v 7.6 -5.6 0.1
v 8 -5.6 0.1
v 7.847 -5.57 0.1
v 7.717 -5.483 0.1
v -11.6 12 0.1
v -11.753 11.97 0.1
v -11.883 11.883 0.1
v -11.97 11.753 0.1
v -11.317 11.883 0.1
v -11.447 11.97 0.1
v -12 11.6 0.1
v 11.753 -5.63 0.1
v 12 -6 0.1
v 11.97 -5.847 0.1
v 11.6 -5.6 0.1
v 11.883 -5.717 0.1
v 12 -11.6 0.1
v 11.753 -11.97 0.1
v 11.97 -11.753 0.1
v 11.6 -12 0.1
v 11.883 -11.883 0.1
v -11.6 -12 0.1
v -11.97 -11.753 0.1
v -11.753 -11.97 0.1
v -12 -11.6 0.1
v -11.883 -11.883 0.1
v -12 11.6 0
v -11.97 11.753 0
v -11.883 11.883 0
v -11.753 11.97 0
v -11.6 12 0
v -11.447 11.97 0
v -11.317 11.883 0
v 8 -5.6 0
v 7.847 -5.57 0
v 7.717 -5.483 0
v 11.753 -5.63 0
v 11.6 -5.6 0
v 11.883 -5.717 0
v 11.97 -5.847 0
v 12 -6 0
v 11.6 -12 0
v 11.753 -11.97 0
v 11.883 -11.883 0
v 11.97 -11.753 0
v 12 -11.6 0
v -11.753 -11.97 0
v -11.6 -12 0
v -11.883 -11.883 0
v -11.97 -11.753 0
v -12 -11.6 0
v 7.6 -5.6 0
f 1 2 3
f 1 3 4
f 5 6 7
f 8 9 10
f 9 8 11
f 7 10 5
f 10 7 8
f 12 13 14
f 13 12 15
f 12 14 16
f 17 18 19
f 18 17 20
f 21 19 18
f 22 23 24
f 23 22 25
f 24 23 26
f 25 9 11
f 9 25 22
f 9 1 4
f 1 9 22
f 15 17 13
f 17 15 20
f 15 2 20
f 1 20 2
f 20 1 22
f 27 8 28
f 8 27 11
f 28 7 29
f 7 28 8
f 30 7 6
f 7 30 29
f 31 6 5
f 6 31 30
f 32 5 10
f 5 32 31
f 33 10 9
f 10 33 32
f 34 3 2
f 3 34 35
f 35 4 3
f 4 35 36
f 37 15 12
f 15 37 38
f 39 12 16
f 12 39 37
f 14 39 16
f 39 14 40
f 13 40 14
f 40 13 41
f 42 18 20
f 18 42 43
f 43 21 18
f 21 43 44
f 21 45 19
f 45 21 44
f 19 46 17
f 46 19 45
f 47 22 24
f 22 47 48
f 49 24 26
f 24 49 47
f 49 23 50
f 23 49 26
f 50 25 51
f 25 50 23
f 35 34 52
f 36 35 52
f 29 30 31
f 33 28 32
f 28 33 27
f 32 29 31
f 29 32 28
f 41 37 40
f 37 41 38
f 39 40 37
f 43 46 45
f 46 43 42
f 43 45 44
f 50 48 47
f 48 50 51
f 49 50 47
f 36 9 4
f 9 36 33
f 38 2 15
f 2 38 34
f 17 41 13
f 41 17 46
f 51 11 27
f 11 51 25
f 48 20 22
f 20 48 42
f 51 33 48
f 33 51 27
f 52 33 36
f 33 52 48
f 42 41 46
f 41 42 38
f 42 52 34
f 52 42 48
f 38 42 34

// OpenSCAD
// file: ../p/3-8cyli.scad
use <../lib.scad>
function ldraw_lib__3_8cyli() = [
// 0 Cylinder 0.375
// 0 Name: 3-8cyli.dat
// 0 Author: James Jessiman
// 0 !LDRAW_ORG Primitive UPDATE 2005-01
// 0 !LICENSE Licensed under CC BY 2.0 and CC BY 4.0 : see CAreadme.txt
// 
// 0 BFC CERTIFY CCW
  [0,"BFC","CERTIFY"],
  [0,"BFC","CCW"],
// 
// 0 !HISTORY 2002-05-08 [OrionP] Made BFC compliant
// 0 !HISTORY 2002-08-18 [PTadmin] Official Update 2002-04
// 0 !HISTORY 2004-12-11 [nielsk] Recreated using Primitive Generator, Edge lines fixed, BFC changed to CCW
// 0 !HISTORY 2005-12-28 [PTadmin] Official Update 2005-01
// 0 !HISTORY 2007-06-24 [PTadmin] Header formatted for Contributor Agreement
// 0 !HISTORY 2008-07-01 [PTadmin] Official Update 2008-01
// 
// 
// 4 16 .9239 1 .3827 .9239 0 .3827 1 0 0 1 1 0
  [4,16,.9239,1,.3827,.9239,0,.3827,1,0,0,1,1,0],
// 4 16 .7071 1 .7071 .7071 0 .7071 .9239 0 .3827 .9239 1 .3827
  [4,16,.7071,1,.7071,.7071,0,.7071,.9239,0,.3827,.9239,1,.3827],
// 4 16 .3827 1 .9239 .3827 0 .9239 .7071 0 .7071 .7071 1 .7071
  [4,16,.3827,1,.9239,.3827,0,.9239,.7071,0,.7071,.7071,1,.7071],
// 4 16 0 1 1 0 0 1 .3827 0 .9239 .3827 1 .9239
  [4,16,0,1,1,0,0,1,.3827,0,.9239,.3827,1,.9239],
// 4 16 -.3827 1 .9239 -.3827 0 .9239 0 0 1 0 1 1
  [4,16,-.3827,1,.9239,-.3827,0,.9239,0,0,1,0,1,1],
// 4 16 -.7071 1 .7071 -.7071 0 .7071 -.3827 0 .9239 -.3827 1 .9239
  [4,16,-.7071,1,.7071,-.7071,0,.7071,-.3827,0,.9239,-.3827,1,.9239],
// 5 24 1 1 0 1 0 0 1 1 -.4142 .9239 1 .3827
  [5,24,1,1,0,1,0,0,1,1,-.4142,.9239,1,.3827],
// 5 24 .9239 1 .3827 .9239 0 .3827 1 1 0 .7071 1 .7071
  [5,24,.9239,1,.3827,.9239,0,.3827,1,1,0,.7071,1,.7071],
// 5 24 .7071 1 .7071 .7071 0 .7071 .9239 1 .3827 .3827 1 .9239
  [5,24,.7071,1,.7071,.7071,0,.7071,.9239,1,.3827,.3827,1,.9239],
// 5 24 .3827 1 .9239 .3827 0 .9239 .7071 1 .7071 0 1 1
  [5,24,.3827,1,.9239,.3827,0,.9239,.7071,1,.7071,0,1,1],
// 5 24 0 1 1 0 0 1 .3827 1 .9239 -.3827 1 .9239
  [5,24,0,1,1,0,0,1,.3827,1,.9239,-.3827,1,.9239],
// 5 24 -.3827 1 .9239 -.3827 0 .9239 0 1 1 -.7071 1 .7071
  [5,24,-.3827,1,.9239,-.3827,0,.9239,0,1,1,-.7071,1,.7071],
// 5 24 -.7071 1 .7071 -.7071 0 .7071 -.3827 1 .9239 -1 1 .4142
  [5,24,-.7071,1,.7071,-.7071,0,.7071,-.3827,1,.9239,-1,1,.4142],
// 0
];
module ldraw_lib__3_8cyli(step=0, col=false, unit=2/5, alt=false, line=0.2, solid=!$preview)
    makepoly(ldraw_lib__3_8cyli(), step=step, col=col, unit=unit, alt=alt, line=line, solid=solid);
ldraw_lib__3_8cyli(line=0.2);
// file: ../p/3-8chrd.scad
use <../lib.scad>
function ldraw_lib__3_8chrd() = [
// 0 Chord 0.375
// 0 Name: 3-8chrd.dat
// 0 Author: Donald Sutter [technog]
// 0 !LDRAW_ORG Primitive UPDATE 2005-01
// 0 !LICENSE Licensed under CC BY 2.0 and CC BY 4.0 : see CAreadme.txt
// 
// 0 BFC CERTIFY CCW
  [0,"BFC","CERTIFY"],
  [0,"BFC","CCW"],
// 
// 0 !HISTORY 2004-01-07 [Steffen] added primitive code for POVray
// 0 !HISTORY 2004-03-18 [mkennedy] removed pov code and rearanged polygons.
// 0 !HISTORY 2004-09-12 [cwdee] reversed winding and standardised precision
// 0 !HISTORY 2005-12-28 [PTadmin] Official Update 2005-01
// 0 !HISTORY 2007-06-24 [PTadmin] Header formatted for Contributor Agreement
// 0 !HISTORY 2008-07-01 [PTadmin] Official Update 2008-01
// 
// 
// 3 16 0.7071 0 0.7071 0.3827 0 0.9239 0 0 1
  [3,16,0.7071,0,0.7071,0.3827,0,0.9239,0,0,1],
// 4 16 0.9239 0 0.3827 -0.3827 0 0.9239 -0.7071 0 0.7071 1 0 0
  [4,16,0.9239,0,0.3827,-0.3827,0,0.9239,-0.7071,0,0.7071,1,0,0],
// 4 16 0.7071 0 0.7071 0 0 1 -0.3827 0 0.9239 0.9239 0 0.3827
  [4,16,0.7071,0,0.7071,0,0,1,-0.3827,0,0.9239,0.9239,0,0.3827],
// 0
];
module ldraw_lib__3_8chrd(step=0, col=false, unit=2/5, alt=false, line=0.2, solid=!$preview)
    makepoly(ldraw_lib__3_8chrd(), step=step, col=col, unit=unit, alt=alt, line=line, solid=solid);
ldraw_lib__3_8chrd(line=0.2);
// file: ../p/1-8ndis.scad
use <../lib.scad>
function ldraw_lib__1_8ndis() = [
// 0 Disc Negative 0.125
// 0 Name: 1-8ndis.dat
// 0 Author: James Jessiman
// 0 !LDRAW_ORG Primitive UPDATE 2012-01
// 0 !LICENSE Licensed under CC BY 2.0 and CC BY 4.0 : see CAreadme.txt
// 
// 0 BFC CERTIFY CCW
  [0,"BFC","CERTIFY"],
  [0,"BFC","CCW"],
// 
// 0 !HISTORY 2002-03-23 [sbliss] Added BFC statement
// 0 !HISTORY 2002-04-25 [PTadmin] Official Update 2002-02
// 0 !HISTORY 2007-06-22 [PTadmin] Header formatted for Contributor Agreement
// 0 !HISTORY 2008-07-01 [PTadmin] Official Update 2008-01
// 0 !HISTORY 2012-02-16 [Philo] Changed to CCW
// 0 !HISTORY 2012-03-30 [PTadmin] Official Update 2012-01
// 
// 
// 3 16 0.9239 0 0.3827 1 0 0 1 0 1
  [3,16,0.9239,0,0.3827,1,0,0,1,0,1],
// 3 16 0.7071 0 0.7071 0.9239 0 0.3827 1 0 1
  [3,16,0.7071,0,0.7071,0.9239,0,0.3827,1,0,1],
];
module ldraw_lib__1_8ndis(step=0, col=false, unit=2/5, alt=false, line=0.2, solid=!$preview)
    makepoly(ldraw_lib__1_8ndis(), step=step, col=col, unit=unit, alt=alt, line=line, solid=solid);
ldraw_lib__1_8ndis(line=0.2);
// file: ../p/1-8cyli.scad
use <../lib.scad>
function ldraw_lib__1_8cyli() = [
// 0 Cylinder 0.125
// 0 Name: 1-8cyli.dat
// 0 Author: James Jessiman
// 0 !LDRAW_ORG Primitive UPDATE 2005-01
// 0 !LICENSE Licensed under CC BY 2.0 and CC BY 4.0 : see CAreadme.txt
// 
// 0 BFC CERTIFY CCW
  [0,"BFC","CERTIFY"],
  [0,"BFC","CCW"],
// 
// 0 !HISTORY 2002-04-25 [PTadmin] Official Update 2002-02
// 0 !HISTORY 2004-12-11 [nielsk] Recreated using Primitive Generator, Edge lines fixed, BFC changed to CCW
// 0 !HISTORY 2005-12-28 [PTadmin] Official Update 2005-01
// 0 !HISTORY 2007-06-22 [PTadmin] Header formatted for Contributor Agreement
// 0 !HISTORY 2008-07-01 [PTadmin] Official Update 2008-01
// 
// 
// 4 16 .9239 1 .3827 .9239 0 .3827 1 0 0 1 1 0
  [4,16,.9239,1,.3827,.9239,0,.3827,1,0,0,1,1,0],
// 4 16 .7071 1 .7071 .7071 0 .7071 .9239 0 .3827 .9239 1 .3827
  [4,16,.7071,1,.7071,.7071,0,.7071,.9239,0,.3827,.9239,1,.3827],
// 5 24 1 1 0 1 0 0 1 1 -.4142 .9239 1 .3827
  [5,24,1,1,0,1,0,0,1,1,-.4142,.9239,1,.3827],
// 5 24 .9239 1 .3827 .9239 0 .3827 1 1 0 .7071 1 .7071
  [5,24,.9239,1,.3827,.9239,0,.3827,1,1,0,.7071,1,.7071],
// 5 24 .7071 1 .7071 .7071 0 .7071 .9239 1 .3827 .4142 1 1
  [5,24,.7071,1,.7071,.7071,0,.7071,.9239,1,.3827,.4142,1,1],
// 0
];
module ldraw_lib__1_8cyli(step=0, col=false, unit=2/5, alt=false, line=0.2, solid=!$preview)
    makepoly(ldraw_lib__1_8cyli(), step=step, col=col, unit=unit, alt=alt, line=line, solid=solid);
ldraw_lib__1_8cyli(line=0.2);
// file: ../p/1-4cyli.scad
use <../lib.scad>
function ldraw_lib__1_4cyli() = [
// 0 Cylinder 0.25
// 0 Name: 1-4cyli.dat
// 0 Author: James Jessiman
// 0 !LDRAW_ORG Primitive UPDATE 2012-01
// 0 !LICENSE Licensed under CC BY 2.0 and CC BY 4.0 : see CAreadme.txt
// 
// 0 BFC CERTIFY CCW
  [0,"BFC","CERTIFY"],
  [0,"BFC","CCW"],
// 
// 0 !HISTORY 2002-03-23 [sbliss] Added BFC statement.
// 0 !HISTORY 2002-04-25 [PTadmin] Official Update 2002-02
// 0 !HISTORY 2007-06-22 [PTadmin] Header formatted for Contributor Agreement
// 0 !HISTORY 2008-07-01 [PTadmin] Official Update 2008-01
// 0 !HISTORY 2012-02-16 [Philo] Changed to CCW
// 0 !HISTORY 2012-03-30 [PTadmin] Official Update 2012-01
// 
// 
// 4 16 1 1 0 0.9239 1 0.3827 0.9239 0 0.3827 1 0 0
  [4,16,1,1,0,0.9239,1,0.3827,0.9239,0,0.3827,1,0,0],
// 5 24 1 0 0 1 1 0 0.9239 0 0.3827 1 0 -1
  [5,24,1,0,0,1,1,0,0.9239,0,0.3827,1,0,-1],
// 4 16 0.9239 1 0.3827 0.7071 1 0.7071 0.7071 0 0.7071 0.9239 0 0.3827
  [4,16,0.9239,1,0.3827,0.7071,1,0.7071,0.7071,0,0.7071,0.9239,0,0.3827],
// 5 24 0.9239 0 0.3827 0.9239 1 0.3827 0.7071 0 0.7071 1 0 0
  [5,24,0.9239,0,0.3827,0.9239,1,0.3827,0.7071,0,0.7071,1,0,0],
// 4 16 0.7071 1 0.7071 0.3827 1 0.9239 0.3827 0 0.9239 0.7071 0 0.7071
  [4,16,0.7071,1,0.7071,0.3827,1,0.9239,0.3827,0,0.9239,0.7071,0,0.7071],
// 5 24 0.7071 0 0.7071 0.7071 1 0.7071 0.3827 0 0.9239 0.9239 0 0.3827
  [5,24,0.7071,0,0.7071,0.7071,1,0.7071,0.3827,0,0.9239,0.9239,0,0.3827],
// 4 16 0.3827 1 0.9239 0 1 1 0 0 1 0.3827 0 0.9239
  [4,16,0.3827,1,0.9239,0,1,1,0,0,1,0.3827,0,0.9239],
// 5 24 0.3827 0 0.9239 0.3827 1 0.9239 0 0 1 0.7071 0 0.7071
  [5,24,0.3827,0,0.9239,0.3827,1,0.9239,0,0,1,0.7071,0,0.7071],
// 5 24 0 0 1 0 1 1 0.3827 0 0.9239 -1 0 1
  [5,24,0,0,1,0,1,1,0.3827,0,0.9239,-1,0,1],
];
module ldraw_lib__1_4cyli(step=0, col=false, unit=2/5, alt=false, line=0.2, solid=!$preview)
    makepoly(ldraw_lib__1_4cyli(), step=step, col=col, unit=unit, alt=alt, line=line, solid=solid);
ldraw_lib__1_4cyli(line=0.2);
// file: ../p/1-4chrd.scad
use <../lib.scad>
function ldraw_lib__1_4chrd() = [
// 0 Chord 0.25
// 0 Name: 1-4chrd.dat
// 0 Author: Tony Hafner [hafhead]
// 0 !LDRAW_ORG Primitive UPDATE 2012-02
// 0 !LICENSE Licensed under CC BY 2.0 and CC BY 4.0 : see CAreadme.txt
// 
// 0 BFC CERTIFY CCW
  [0,"BFC","CERTIFY"],
  [0,"BFC","CCW"],
// 
// 0 !HISTORY 2004-04-22 [PTadmin] Official Update 2004-02
// 0 !HISTORY 2007-10-09 [PTadmin] Header formatted for Contributor Agreement
// 0 !HISTORY 2008-07-01 [PTadmin] Official Update 2008-01
// 0 !HISTORY 2012-08-02 [MMR1988] Re-creation with PrimGen2 and Rectifier
// 0 !HISTORY 2012-08-09 [PTadmin] Official Update 2012-02
// 
// 
// 4 16 0.9239 0 0.3827 0.3827 0 0.9239 0 0 1 1 0 0
  [4,16,0.9239,0,0.3827,0.3827,0,0.9239,0,0,1,1,0,0],
// 3 16 0.7071 0 0.7071 0.3827 0 0.9239 0.9239 0 0.3827
  [3,16,0.7071,0,0.7071,0.3827,0,0.9239,0.9239,0,0.3827],
];
module ldraw_lib__1_4chrd(step=0, col=false, unit=2/5, alt=false, line=0.2, solid=!$preview)
    makepoly(ldraw_lib__1_4chrd(), step=step, col=col, unit=unit, alt=alt, line=line, solid=solid);
ldraw_lib__1_4chrd(line=0.2);
// file: 4111899e.scad
use <../lib.scad>
use <../p/1-4chrd.scad>
use <../p/1-4cyli.scad>
use <../p/1-8cyli.scad>
use <../p/1-8ndis.scad>
use <../p/3-8chrd.scad>
use <../p/3-8cyli.scad>
function ldraw_lib__4111899e() = [
// 0 Sticker  3.0 x  3.0 Polygon Yellow - Aligned Right
// 0 Name: 4111899e.dat
// 0 Author: Ulrich Röder [UR]
// 0 !LDRAW_ORG Part UPDATE 2020-03
// 0 !LICENSE Licensed under CC BY 2.0 and CC BY 4.0 : see CAreadme.txt
// 
// 0 BFC CERTIFY CCW
  [0,"BFC","CERTIFY"],
  [0,"BFC","CCW"],
// 
// 0 !KEYWORDS Black Thunder, helicopter, Set 5542
// 
// 0 !HISTORY 2020-12-29 [PTadmin] Official Update 2020-03
// 
// 
// 1 14 -20 -.25 -13 0 0 1 0 1 0 -1 0 0 1-8ndis.dat
  [1,14,-20,-.25,-13,0,0,1,0,1,0,-1,0,0, ldraw_lib__1_8ndis()],
// 1 14 29 -.25 29 1 0 0 0 1 0 0 0 1 3-8chrd.dat
  [1,14,29,-.25,29,1,0,0,0,1,0,0,0,1, ldraw_lib__3_8chrd()],
// 1 14 -29 -.25 -15 0 0 -1 0 1 0 1 0 0 1-4chrd.dat
  [1,14,-29,-.25,-15,0,0,-1,0,1,0,1,0,0, ldraw_lib__1_4chrd()],
// 1 14 -29 -.25 -29 0 0 -1 0 1 0 -1 0 0 1-4chrd.dat
  [1,14,-29,-.25,-29,0,0,-1,0,1,0,-1,0,0, ldraw_lib__1_4chrd()],
// 1 14 29 -.25 -29 0 0 1 0 1 0 -1 0 0 1-4chrd.dat
  [1,14,29,-.25,-29,0,0,1,0,1,0,-1,0,0, ldraw_lib__1_4chrd()],
// 4 14 30 -.25 -29 30 -.25 29 28.2929 -.25 29.7071 29 -.25 -30
  [4,14,30,-.25,-29,30,-.25,29,28.2929,-.25,29.7071,29,-.25,-30],
// 4 14 28.2929 -.25 29.7071 -19.2929 -.25 -13.7071 -19 -.25 -14 29 -.25 -30
  [4,14,28.2929,-.25,29.7071,-19.2929,-.25,-13.7071,-19,-.25,-14,29,-.25,-30],
// 4 14 -30 -.25 -15 -30 -.25 -29 -29 -.25 -30 -29 -.25 -14
  [4,14,-30,-.25,-15,-30,-.25,-29,-29,-.25,-30,-29,-.25,-14],
// 3 14 -29 -.25 -30 -20 -.25 -14 -29 -.25 -14
  [3,14,-29,-.25,-30,-20,-.25,-14,-29,-.25,-14],
// 4 14 -20 -.25 -14 -29 -.25 -30 29 -.25 -30 -19 -.25 -14
  [4,14,-20,-.25,-14,-29,-.25,-30,29,-.25,-30,-19,-.25,-14],
// 
// 1 16 29 0 29 1 0 0 0 -.25 0 0 0 1 3-8cyli.dat
  [1,16,29,0,29,1,0,0,0,-.25,0,0,0,1, ldraw_lib__3_8cyli()],
// 0 BFC INVERTNEXT
  [0,"BFC","INVERTNEXT"],
// 1 16 -20 0 -13 0 0 1 0 -.25 0 -1 0 0 1-8cyli.dat
  [1,16,-20,0,-13,0,0,1,0,-.25,0,-1,0,0, ldraw_lib__1_8cyli()],
// 1 16 -29 0 -15 0 0 -1 0 -.25 0 1 0 0 1-4cyli.dat
  [1,16,-29,0,-15,0,0,-1,0,-.25,0,1,0,0, ldraw_lib__1_4cyli()],
// 1 16 -29 0 -29 0 0 -1 0 -.25 0 -1 0 0 1-4cyli.dat
  [1,16,-29,0,-29,0,0,-1,0,-.25,0,-1,0,0, ldraw_lib__1_4cyli()],
// 1 16 29 0 -29 0 0 1 0 -.25 0 -1 0 0 1-4cyli.dat
  [1,16,29,0,-29,0,0,1,0,-.25,0,-1,0,0, ldraw_lib__1_4cyli()],
// 1 16 -20 0 -13 0 0 1 0 -1 0 -1 0 0 1-8ndis.dat
  [1,16,-20,0,-13,0,0,1,0,-1,0,-1,0,0, ldraw_lib__1_8ndis()],
// 1 16 29 0 29 1 0 0 0 -1 0 0 0 1 3-8chrd.dat
  [1,16,29,0,29,1,0,0,0,-1,0,0,0,1, ldraw_lib__3_8chrd()],
// 1 16 -29 0 -15 0 0 -1 0 -1 0 1 0 0 1-4chrd.dat
  [1,16,-29,0,-15,0,0,-1,0,-1,0,1,0,0, ldraw_lib__1_4chrd()],
// 1 16 -29 0 -29 0 0 -1 0 -1 0 -1 0 0 1-4chrd.dat
  [1,16,-29,0,-29,0,0,-1,0,-1,0,-1,0,0, ldraw_lib__1_4chrd()],
// 1 16 29 0 -29 0 0 1 0 -1 0 -1 0 0 1-4chrd.dat
  [1,16,29,0,-29,0,0,1,0,-1,0,-1,0,0, ldraw_lib__1_4chrd()],
// 4 16 28.2929 -.25 29.7071 28.2929 0 29.7071 -19.2929 0 -13.7071 -19.2929 -.25 -13.7071
  [4,16,28.2929,-.25,29.7071,28.2929,0,29.7071,-19.2929,0,-13.7071,-19.2929,-.25,-13.7071],
// 4 16 -20 -.25 -14 -20 0 -14 -29 0 -14 -29 -.25 -14
  [4,16,-20,-.25,-14,-20,0,-14,-29,0,-14,-29,-.25,-14],
// 4 16 -30 -.25 -15 -30 0 -15 -30 0 -29 -30 -.25 -29
  [4,16,-30,-.25,-15,-30,0,-15,-30,0,-29,-30,-.25,-29],
// 4 16 30 0 -29 30 0 29 30 -.25 29 30 -.25 -29
  [4,16,30,0,-29,30,0,29,30,-.25,29,30,-.25,-29],
// 4 16 -29 -.25 -30 -29 0 -30 29 0 -30 29 -.25 -30
  [4,16,-29,-.25,-30,-29,0,-30,29,0,-30,29,-.25,-30],
// 4 16 28.2929 0 29.7071 30 0 29 30 0 -29 29 0 -30
  [4,16,28.2929,0,29.7071,30,0,29,30,0,-29,29,0,-30],
// 4 16 -19 0 -14 -19.2929 0 -13.7071 28.2929 0 29.7071 29 0 -30
  [4,16,-19,0,-14,-19.2929,0,-13.7071,28.2929,0,29.7071,29,0,-30],
// 4 16 -29 0 -30 -30 0 -29 -30 0 -15 -29 0 -14
  [4,16,-29,0,-30,-30,0,-29,-30,0,-15,-29,0,-14],
// 4 16 29 0 -30 -29 0 -30 -20 0 -14 -19 0 -14
  [4,16,29,0,-30,-29,0,-30,-20,0,-14,-19,0,-14],
// 3 16 -20 0 -14 -29 0 -30 -29 0 -14
  [3,16,-20,0,-14,-29,0,-30,-29,0,-14],
];
module ldraw_lib__4111899e(step=0, col=false, unit=2/5, alt=false, line=0.2, solid=!$preview)
    makepoly(ldraw_lib__4111899e(), step=step, col=col, unit=unit, alt=alt, line=line, solid=solid);
ldraw_lib__4111899e(line=0.2);
// main file
use <../lib.scad>
use <4111899e.scad>
function ldraw_lib__4111899f() = [
// 0 Sticker  3.0 x  3.0 Polygon Yellow - Aligned Left
// 0 Name: 4111899f.dat
// 0 Author: Ulrich Röder [UR]
// 0 !LDRAW_ORG Part UPDATE 2020-03
// 0 !LICENSE Licensed under CC BY 2.0 and CC BY 4.0 : see CAreadme.txt
// 
// 0 BFC CERTIFY CCW
  [0,"BFC","CERTIFY"],
  [0,"BFC","CCW"],
// 
// 0 !KEYWORDS Black Thunder, helicopter, Set 5542
// 
// 0 !HISTORY 2020-12-29 [PTadmin] Official Update 2020-03
// 
// 
// 1 16 0 0 0 -1 0 0 0 1 0 0 0 1 4111899e.dat
  [1,16,0,0,0,-1,0,0,0,1,0,0,0,1, ldraw_lib__4111899e()],
];
module ldraw_lib__4111899f(step=0, col=false, unit=2/5, alt=false, line=0.2, solid=!$preview)
    makepoly(ldraw_lib__4111899f(), step=step, col=col, unit=unit, alt=alt, line=line, solid=solid);
ldraw_lib__4111899f(line=0.2);
